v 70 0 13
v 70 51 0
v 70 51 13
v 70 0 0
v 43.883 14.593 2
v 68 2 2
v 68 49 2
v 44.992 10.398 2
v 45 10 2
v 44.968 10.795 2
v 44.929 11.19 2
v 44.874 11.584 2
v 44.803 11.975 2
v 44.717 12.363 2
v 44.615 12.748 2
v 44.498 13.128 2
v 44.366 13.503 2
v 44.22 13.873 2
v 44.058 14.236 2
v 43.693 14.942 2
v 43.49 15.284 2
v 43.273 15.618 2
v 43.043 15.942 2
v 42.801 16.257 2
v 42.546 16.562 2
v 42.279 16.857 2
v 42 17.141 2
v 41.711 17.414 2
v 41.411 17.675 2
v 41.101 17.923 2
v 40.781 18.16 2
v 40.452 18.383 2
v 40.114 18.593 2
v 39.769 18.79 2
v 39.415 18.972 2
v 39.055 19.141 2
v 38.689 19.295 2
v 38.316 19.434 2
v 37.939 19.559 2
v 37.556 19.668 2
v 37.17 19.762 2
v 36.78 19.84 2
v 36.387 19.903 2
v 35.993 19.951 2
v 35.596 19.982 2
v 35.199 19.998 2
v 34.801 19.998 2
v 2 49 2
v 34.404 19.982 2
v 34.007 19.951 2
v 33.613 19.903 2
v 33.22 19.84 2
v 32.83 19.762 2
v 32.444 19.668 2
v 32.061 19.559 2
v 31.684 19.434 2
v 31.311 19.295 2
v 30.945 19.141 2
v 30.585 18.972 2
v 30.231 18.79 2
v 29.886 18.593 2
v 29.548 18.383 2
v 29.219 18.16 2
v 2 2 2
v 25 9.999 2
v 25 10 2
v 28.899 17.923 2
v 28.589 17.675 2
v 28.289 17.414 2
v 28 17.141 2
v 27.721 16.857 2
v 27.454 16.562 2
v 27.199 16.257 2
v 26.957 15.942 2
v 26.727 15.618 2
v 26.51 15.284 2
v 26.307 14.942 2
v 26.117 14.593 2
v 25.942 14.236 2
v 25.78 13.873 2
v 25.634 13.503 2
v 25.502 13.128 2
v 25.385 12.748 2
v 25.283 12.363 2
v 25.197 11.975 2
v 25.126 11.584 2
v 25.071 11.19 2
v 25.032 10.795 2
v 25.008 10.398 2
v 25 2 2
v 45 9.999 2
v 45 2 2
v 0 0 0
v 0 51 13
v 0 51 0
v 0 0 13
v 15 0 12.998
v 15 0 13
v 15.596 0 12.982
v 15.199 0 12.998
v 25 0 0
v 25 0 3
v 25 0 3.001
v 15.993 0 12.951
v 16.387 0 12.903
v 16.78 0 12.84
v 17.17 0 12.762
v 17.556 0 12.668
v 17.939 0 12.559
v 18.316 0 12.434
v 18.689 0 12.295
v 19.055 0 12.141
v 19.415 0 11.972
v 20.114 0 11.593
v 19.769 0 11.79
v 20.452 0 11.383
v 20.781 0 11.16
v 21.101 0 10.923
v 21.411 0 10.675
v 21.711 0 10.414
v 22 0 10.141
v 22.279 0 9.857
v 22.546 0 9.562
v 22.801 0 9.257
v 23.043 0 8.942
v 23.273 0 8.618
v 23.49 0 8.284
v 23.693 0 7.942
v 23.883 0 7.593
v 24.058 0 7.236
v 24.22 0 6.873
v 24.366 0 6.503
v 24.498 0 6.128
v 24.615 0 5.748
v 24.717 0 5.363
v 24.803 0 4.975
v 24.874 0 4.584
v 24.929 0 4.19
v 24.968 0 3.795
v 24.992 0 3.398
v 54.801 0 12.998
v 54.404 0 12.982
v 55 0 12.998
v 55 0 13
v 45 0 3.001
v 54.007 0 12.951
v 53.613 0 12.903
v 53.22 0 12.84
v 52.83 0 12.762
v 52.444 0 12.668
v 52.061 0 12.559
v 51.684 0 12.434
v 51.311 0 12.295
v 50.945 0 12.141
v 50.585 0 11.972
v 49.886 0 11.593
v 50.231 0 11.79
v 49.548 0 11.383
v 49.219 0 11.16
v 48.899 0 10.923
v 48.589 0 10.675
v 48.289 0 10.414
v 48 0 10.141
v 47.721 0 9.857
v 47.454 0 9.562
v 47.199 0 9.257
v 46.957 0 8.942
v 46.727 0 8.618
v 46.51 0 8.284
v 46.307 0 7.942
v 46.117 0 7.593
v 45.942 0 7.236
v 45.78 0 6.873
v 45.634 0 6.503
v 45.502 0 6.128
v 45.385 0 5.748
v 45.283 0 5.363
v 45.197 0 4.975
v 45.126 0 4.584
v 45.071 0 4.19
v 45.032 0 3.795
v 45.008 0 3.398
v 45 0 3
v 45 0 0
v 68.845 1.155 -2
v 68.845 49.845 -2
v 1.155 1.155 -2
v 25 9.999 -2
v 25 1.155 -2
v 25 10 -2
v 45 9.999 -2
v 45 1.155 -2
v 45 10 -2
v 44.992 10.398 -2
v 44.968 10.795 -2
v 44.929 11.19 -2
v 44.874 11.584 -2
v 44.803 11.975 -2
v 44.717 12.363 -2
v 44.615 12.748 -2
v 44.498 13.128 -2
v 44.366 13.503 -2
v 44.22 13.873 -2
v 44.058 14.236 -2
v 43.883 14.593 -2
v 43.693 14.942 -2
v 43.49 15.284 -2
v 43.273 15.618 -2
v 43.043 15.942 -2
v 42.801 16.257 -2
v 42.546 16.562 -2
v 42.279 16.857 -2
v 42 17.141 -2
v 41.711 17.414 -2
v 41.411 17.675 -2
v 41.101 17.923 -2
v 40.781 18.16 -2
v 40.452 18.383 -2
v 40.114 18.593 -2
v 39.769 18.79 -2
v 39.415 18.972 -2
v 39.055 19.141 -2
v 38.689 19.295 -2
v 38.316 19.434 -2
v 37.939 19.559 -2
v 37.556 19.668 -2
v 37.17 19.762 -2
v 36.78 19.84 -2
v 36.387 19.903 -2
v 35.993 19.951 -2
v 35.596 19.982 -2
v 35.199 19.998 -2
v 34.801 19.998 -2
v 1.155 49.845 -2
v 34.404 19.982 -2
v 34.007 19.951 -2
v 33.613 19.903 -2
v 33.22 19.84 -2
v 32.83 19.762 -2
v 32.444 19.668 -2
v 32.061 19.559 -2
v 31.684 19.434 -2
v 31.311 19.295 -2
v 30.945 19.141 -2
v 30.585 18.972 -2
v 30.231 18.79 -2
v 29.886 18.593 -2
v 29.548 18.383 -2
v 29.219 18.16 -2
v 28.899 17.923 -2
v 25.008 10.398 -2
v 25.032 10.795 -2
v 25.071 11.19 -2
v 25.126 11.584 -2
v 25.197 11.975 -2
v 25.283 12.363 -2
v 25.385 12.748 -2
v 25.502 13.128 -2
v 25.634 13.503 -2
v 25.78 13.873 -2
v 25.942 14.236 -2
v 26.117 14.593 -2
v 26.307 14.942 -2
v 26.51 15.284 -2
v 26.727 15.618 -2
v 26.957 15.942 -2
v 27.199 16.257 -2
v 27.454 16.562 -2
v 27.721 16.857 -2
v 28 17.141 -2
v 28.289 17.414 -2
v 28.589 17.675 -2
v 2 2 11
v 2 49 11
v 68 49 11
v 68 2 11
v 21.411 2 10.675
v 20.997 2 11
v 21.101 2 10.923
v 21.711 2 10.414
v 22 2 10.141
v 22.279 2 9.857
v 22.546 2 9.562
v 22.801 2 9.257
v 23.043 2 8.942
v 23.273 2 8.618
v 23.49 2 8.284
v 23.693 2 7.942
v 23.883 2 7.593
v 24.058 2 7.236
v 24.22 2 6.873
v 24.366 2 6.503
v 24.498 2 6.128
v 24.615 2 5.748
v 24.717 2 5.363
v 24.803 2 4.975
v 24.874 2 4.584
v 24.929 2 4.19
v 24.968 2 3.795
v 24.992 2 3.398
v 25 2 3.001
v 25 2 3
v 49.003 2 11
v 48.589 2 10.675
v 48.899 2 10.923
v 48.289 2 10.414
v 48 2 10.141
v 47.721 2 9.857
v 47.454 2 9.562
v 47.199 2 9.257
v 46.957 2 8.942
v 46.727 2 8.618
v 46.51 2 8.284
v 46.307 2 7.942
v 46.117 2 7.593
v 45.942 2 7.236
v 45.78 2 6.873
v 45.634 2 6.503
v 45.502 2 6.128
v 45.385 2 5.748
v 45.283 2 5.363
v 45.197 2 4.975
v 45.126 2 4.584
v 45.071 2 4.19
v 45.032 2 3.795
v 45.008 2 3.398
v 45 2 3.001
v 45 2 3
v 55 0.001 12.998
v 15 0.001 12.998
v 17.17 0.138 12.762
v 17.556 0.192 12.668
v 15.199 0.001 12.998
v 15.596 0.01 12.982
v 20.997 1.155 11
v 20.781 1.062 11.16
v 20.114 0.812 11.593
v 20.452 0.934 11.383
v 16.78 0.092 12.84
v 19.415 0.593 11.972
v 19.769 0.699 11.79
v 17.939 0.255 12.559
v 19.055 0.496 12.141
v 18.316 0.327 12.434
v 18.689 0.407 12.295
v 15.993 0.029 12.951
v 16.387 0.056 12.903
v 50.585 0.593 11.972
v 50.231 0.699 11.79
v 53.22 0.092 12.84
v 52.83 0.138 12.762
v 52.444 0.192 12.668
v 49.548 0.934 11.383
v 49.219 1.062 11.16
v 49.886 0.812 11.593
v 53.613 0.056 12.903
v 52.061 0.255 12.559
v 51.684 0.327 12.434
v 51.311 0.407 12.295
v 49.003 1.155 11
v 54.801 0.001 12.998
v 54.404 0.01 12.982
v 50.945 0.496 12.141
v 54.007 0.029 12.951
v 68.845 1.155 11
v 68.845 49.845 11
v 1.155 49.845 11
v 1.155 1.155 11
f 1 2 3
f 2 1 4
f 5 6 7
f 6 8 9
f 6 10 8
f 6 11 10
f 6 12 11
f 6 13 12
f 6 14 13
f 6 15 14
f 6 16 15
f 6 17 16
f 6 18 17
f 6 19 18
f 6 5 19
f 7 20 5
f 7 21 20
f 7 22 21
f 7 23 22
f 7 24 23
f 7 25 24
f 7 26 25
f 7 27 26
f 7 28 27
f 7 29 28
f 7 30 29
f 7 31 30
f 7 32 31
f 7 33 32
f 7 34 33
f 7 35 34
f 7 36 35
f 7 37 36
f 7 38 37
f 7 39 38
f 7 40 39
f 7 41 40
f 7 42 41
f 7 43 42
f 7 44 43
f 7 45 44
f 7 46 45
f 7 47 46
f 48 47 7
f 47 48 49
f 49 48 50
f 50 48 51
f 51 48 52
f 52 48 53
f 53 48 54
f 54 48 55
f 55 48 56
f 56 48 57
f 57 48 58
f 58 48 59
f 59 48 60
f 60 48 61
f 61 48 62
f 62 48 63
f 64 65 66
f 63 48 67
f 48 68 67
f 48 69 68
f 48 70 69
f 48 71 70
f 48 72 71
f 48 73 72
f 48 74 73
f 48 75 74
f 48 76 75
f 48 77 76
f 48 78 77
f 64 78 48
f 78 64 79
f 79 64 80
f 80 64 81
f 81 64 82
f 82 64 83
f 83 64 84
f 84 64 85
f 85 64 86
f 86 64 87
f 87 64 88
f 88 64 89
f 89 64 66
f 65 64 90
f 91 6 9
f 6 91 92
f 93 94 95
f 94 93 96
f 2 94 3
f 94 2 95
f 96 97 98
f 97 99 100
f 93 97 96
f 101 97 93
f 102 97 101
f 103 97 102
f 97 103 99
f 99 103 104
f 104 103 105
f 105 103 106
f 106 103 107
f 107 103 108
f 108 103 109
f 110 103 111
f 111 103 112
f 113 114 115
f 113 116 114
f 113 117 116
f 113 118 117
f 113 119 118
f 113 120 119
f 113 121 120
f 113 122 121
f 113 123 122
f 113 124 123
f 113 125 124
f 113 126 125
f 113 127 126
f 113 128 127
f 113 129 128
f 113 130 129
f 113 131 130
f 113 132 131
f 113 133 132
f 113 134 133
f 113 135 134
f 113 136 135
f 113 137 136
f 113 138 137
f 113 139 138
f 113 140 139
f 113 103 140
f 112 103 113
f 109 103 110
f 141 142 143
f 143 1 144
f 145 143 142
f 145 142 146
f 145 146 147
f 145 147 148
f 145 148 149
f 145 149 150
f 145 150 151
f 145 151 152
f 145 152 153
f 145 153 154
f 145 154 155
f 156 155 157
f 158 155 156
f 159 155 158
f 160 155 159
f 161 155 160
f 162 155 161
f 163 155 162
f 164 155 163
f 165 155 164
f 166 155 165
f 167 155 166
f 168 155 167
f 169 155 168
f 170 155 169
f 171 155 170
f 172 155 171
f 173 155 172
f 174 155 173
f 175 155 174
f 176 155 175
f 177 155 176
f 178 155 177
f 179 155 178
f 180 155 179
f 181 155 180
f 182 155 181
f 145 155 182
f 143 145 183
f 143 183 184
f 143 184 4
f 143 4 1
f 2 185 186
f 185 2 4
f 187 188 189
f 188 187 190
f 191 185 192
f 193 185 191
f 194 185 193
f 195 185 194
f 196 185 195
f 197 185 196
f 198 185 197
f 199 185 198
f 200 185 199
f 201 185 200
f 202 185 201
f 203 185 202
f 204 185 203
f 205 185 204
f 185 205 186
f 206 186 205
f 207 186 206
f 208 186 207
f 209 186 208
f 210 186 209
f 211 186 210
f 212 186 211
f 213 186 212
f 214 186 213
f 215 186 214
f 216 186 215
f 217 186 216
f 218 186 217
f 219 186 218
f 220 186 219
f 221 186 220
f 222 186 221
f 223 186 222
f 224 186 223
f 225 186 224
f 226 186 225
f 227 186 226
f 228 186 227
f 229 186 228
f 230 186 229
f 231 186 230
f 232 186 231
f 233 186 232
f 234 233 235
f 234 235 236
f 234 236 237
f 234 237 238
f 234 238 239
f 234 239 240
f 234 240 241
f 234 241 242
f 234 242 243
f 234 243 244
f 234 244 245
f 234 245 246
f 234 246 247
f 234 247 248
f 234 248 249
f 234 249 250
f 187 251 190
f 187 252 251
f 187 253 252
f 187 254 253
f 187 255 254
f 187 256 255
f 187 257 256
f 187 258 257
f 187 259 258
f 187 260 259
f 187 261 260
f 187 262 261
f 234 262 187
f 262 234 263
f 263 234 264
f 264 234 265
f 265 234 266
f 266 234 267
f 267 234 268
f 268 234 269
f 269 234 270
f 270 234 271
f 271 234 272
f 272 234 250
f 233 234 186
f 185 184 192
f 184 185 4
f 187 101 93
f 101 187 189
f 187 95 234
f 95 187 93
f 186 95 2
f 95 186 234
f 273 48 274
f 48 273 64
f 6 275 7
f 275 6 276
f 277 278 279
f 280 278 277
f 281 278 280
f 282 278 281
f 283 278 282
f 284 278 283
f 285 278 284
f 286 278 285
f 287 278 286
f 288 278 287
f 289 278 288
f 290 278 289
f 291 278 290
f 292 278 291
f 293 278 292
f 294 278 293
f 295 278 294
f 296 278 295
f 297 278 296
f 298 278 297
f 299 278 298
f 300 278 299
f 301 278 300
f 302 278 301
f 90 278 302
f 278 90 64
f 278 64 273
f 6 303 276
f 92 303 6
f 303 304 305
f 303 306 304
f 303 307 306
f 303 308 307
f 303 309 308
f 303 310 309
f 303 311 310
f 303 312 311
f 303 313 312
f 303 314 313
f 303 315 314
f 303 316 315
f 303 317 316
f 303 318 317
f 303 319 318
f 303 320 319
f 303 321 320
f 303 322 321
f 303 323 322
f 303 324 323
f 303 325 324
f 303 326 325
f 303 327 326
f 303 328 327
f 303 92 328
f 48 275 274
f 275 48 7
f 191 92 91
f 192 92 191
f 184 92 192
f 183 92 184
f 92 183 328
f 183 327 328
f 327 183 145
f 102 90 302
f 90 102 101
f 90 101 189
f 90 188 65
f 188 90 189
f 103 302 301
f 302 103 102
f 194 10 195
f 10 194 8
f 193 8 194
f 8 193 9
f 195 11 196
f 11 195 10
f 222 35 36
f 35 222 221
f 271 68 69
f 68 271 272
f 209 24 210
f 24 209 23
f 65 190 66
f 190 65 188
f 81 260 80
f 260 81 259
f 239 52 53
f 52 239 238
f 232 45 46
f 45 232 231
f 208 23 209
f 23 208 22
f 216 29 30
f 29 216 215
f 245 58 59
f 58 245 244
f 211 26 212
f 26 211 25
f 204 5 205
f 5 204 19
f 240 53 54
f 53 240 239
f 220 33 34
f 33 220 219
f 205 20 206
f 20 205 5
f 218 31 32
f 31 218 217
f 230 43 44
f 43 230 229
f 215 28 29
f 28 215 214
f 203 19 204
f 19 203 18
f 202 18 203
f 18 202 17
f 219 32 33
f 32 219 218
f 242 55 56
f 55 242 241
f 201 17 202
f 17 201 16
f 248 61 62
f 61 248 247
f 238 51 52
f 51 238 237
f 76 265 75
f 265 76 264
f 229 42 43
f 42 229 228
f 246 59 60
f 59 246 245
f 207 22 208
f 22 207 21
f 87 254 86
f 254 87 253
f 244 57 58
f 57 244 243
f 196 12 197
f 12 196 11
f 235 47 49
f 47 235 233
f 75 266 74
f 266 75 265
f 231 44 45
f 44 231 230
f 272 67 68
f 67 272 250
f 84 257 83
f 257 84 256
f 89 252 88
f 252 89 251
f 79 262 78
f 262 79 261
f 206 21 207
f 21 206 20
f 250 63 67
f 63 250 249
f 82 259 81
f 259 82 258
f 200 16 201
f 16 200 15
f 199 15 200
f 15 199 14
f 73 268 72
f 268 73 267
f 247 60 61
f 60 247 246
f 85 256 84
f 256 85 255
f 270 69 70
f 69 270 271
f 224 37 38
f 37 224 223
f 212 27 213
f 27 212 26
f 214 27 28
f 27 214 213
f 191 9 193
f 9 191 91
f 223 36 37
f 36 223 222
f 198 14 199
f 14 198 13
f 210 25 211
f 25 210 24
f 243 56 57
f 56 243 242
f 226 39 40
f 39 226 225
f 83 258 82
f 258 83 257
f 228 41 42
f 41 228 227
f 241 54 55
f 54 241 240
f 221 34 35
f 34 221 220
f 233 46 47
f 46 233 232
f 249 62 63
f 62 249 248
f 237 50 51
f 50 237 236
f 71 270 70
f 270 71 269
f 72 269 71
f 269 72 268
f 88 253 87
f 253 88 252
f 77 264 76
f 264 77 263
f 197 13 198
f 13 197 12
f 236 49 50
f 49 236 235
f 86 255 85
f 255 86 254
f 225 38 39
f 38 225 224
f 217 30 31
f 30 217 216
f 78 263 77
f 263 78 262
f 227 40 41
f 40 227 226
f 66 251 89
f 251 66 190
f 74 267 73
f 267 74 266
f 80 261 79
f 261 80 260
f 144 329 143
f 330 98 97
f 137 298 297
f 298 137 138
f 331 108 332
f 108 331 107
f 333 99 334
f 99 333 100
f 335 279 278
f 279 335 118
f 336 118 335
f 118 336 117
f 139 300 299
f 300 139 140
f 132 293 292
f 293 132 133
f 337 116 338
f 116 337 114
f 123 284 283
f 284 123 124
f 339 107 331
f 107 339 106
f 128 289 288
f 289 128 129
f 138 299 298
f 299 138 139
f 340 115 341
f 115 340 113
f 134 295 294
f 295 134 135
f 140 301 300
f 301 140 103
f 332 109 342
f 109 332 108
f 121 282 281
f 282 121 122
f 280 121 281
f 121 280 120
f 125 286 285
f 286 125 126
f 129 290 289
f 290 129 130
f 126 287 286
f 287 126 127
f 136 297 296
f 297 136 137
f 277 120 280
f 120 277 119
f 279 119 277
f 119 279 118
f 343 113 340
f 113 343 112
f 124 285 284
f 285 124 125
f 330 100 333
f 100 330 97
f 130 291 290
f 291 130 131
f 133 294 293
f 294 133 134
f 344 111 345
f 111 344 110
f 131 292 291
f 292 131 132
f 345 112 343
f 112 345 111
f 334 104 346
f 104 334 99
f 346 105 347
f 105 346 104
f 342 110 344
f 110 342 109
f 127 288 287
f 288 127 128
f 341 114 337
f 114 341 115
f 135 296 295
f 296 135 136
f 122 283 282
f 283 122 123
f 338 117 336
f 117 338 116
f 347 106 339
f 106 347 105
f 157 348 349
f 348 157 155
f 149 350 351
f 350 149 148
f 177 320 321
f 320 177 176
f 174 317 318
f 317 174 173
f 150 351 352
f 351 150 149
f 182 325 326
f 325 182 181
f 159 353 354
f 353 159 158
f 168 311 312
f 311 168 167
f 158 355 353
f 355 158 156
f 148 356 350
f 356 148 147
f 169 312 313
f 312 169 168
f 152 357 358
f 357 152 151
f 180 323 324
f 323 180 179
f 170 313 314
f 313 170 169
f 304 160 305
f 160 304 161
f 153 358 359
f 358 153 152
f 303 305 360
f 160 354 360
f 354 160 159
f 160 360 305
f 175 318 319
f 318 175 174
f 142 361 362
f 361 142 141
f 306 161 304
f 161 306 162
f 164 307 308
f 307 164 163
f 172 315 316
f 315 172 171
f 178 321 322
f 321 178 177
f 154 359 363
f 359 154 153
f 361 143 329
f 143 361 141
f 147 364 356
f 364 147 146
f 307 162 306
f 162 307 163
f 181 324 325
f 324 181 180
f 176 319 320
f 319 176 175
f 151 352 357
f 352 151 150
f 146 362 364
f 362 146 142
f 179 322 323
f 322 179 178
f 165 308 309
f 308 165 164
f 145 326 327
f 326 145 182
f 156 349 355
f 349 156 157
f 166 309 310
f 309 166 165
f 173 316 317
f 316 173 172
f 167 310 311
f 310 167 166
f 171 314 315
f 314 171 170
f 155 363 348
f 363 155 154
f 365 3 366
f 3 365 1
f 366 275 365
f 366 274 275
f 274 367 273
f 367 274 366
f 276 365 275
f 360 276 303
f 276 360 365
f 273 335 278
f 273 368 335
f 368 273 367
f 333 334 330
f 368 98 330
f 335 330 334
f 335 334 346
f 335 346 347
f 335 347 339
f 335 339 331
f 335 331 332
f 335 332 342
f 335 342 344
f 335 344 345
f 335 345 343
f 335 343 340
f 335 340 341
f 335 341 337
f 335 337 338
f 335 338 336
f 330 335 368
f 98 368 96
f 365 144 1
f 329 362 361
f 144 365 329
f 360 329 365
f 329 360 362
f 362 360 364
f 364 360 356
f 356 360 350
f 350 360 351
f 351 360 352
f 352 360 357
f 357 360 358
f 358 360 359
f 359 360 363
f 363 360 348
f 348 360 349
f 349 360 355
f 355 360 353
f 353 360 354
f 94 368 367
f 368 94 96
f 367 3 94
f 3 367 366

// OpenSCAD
// file: card_holder.scad
use <stackable_box.scad>
$fa = 1;
$fs = 0.4;
module slot(width,depth,height,thickness,rounded_slot=true) {
    difference() {
        union () {
            translate([-width/2,-0.001,thickness]) cube([width,thickness+0.002,height]);
            translate([0,depth-width/2,-thickness-0.001]) cylinder(d=width,h=2*thickness+0.003);
            translate([-width/2,-0.001,-thickness-0.001]) cube([width,depth-width/2,2*thickness+0.003]);
            //Cutout in preparation for rounded edges
            if (rounded_slot) {translate([-width,-0.001,height-width/2+0.001]) cube([width*2,thickness+0.002,width/2+0.002]);}
        };
        //Rounded edges of slot
        if (rounded_slot) {
            translate([-width,thickness+0.003,height-width/2]) rotate([90,0,0]) cylinder(d=width,h=thickness+0.004);
            translate([width,thickness+0.003,height-width/2]) rotate([90,0,0]) cylinder(d=width,h=thickness+0.004);
        }
    };
};
module card_holder(card_width=64,card_height=89,thickness=2,height=40,slot_width=20,slot_depth=20,tolerance=0.5,slots=[1,0,0,0],rounded_slot=true,stackable=false,max_angle=30) {
    card_height=card_height+2*tolerance;
    card_width=card_width+2*tolerance;
    base_height=2*thickness+card_height;
    base_width=2*thickness+card_width;
    full_height=thickness+height;
    union() {
        difference() {
            union() {
                //base
                cube([base_height,base_width,thickness]);
                if (stackable) { base(length=base_width,width=base_height,thickness=thickness,max_angle=max_angle); }
                //width walls
                cube([thickness,base_width,full_height]);
                translate([base_height-thickness,0,0]) cube([thickness,base_width,full_height]);
                //height walls
                cube([base_height,thickness,full_height]);
                translate([0,base_width-thickness,0]) cube([base_height,thickness,full_height]);
            };
            if(slots[0] == 1) {
                translate([base_height/2,0,0]) slot(width=slot_width,depth=slot_depth,height=full_height,thickness=thickness,rounded_slot=rounded_slot);
            };
            if(slots[1] == 1) {
                translate([0,base_width/2,0]) rotate([0,0,270]) slot(width=slot_width,depth=slot_depth,height=full_height,thickness=thickness,rounded_slot=rounded_slot);
            };
            if(slots[2] == 1) {
                translate([base_height/2,base_width,0]) rotate([0,0,180]) slot(width=slot_width,depth=slot_depth,height=full_height,thickness=thickness,rounded_slot=rounded_slot);
            };
            if(slots[3] == 1) {
                translate([base_height,base_width/2,0]) rotate([0,0,90]) slot(width=slot_width,depth=slot_depth,height=full_height,thickness=thickness,rounded_slot=rounded_slot);
            }
            if(stackable) {translate([0,0,full_height]) base(length=base_width,width=base_height,thickness=thickness,max_angle=max_angle);}
        };
    };
};
card_holder();
//slot(width=20,deph=20,thickness=2,height=30);
// main file
use <card_holder.scad>
$fa = 1;
$fs = 0.4;
module base(length=60,width=40,thickness=2,max_angle=30) {
    w = thickness*tan(max_angle);
    polyhedron(
        points=[ 
            [0,0,0],
            [width,0,0],
            [width,length,0],
            [0,length,0],
            [w,w,-thickness],
            [width-w,w,-thickness],
            [width-w,length-w,-thickness],
            [w,length-w,-thickness]
        ],
        faces = [
            [0,3,2,1],
            [0,1,5,4],
            [1,2,6,5],
            [2,3,7,6],
            [3,0,4,7],
            [4,5,6,7]
        ]
    );
};
module stackable_box_lid(length=60,width=40,thickness=2,tolerance=0.5, max_angle=30) {
    d=0.001;
    //base
    translate([0,0,0]) union () {
        cube([width,length,thickness]);
        base(length,width,thickness,max_angle);
    };
};
module stackable_box(length=60,width=40,height=30,thickness=2,tolerance=0.5,bottom=false, max_angle=30) {
    difference() {
        union() {
            cube([width,length,thickness]);
            if (!bottom) { base(length=length,width=width,thickness=thickness,max_angle=max_angle); }
            cube([width,thickness,height]);
            cube([thickness,length,height]);
            translate([0,length-thickness,0]) cube([width,thickness,height]);
            translate([width-thickness,0,0]) cube([thickness,length,height]);
        };
        translate([0,0,height]) base(length=length,width=width,thickness=thickness,max_angle=max_angle);
    };
};



// Critter pieces box (x10)
//stackable_box(width=58, length=67.5, height=15);

// Special event card & forest card boxes (x2)
//card_holder(card_width=46, card_height=65, height=28, stackable=true);

// Card holders for expansion cards (x1)
//card_holder(card_width=46, card_height=65, height=15, stackable=true); 
card_holder(card_width=46, card_height=65, height=11, stackable=true);

//base(thickness=2);
